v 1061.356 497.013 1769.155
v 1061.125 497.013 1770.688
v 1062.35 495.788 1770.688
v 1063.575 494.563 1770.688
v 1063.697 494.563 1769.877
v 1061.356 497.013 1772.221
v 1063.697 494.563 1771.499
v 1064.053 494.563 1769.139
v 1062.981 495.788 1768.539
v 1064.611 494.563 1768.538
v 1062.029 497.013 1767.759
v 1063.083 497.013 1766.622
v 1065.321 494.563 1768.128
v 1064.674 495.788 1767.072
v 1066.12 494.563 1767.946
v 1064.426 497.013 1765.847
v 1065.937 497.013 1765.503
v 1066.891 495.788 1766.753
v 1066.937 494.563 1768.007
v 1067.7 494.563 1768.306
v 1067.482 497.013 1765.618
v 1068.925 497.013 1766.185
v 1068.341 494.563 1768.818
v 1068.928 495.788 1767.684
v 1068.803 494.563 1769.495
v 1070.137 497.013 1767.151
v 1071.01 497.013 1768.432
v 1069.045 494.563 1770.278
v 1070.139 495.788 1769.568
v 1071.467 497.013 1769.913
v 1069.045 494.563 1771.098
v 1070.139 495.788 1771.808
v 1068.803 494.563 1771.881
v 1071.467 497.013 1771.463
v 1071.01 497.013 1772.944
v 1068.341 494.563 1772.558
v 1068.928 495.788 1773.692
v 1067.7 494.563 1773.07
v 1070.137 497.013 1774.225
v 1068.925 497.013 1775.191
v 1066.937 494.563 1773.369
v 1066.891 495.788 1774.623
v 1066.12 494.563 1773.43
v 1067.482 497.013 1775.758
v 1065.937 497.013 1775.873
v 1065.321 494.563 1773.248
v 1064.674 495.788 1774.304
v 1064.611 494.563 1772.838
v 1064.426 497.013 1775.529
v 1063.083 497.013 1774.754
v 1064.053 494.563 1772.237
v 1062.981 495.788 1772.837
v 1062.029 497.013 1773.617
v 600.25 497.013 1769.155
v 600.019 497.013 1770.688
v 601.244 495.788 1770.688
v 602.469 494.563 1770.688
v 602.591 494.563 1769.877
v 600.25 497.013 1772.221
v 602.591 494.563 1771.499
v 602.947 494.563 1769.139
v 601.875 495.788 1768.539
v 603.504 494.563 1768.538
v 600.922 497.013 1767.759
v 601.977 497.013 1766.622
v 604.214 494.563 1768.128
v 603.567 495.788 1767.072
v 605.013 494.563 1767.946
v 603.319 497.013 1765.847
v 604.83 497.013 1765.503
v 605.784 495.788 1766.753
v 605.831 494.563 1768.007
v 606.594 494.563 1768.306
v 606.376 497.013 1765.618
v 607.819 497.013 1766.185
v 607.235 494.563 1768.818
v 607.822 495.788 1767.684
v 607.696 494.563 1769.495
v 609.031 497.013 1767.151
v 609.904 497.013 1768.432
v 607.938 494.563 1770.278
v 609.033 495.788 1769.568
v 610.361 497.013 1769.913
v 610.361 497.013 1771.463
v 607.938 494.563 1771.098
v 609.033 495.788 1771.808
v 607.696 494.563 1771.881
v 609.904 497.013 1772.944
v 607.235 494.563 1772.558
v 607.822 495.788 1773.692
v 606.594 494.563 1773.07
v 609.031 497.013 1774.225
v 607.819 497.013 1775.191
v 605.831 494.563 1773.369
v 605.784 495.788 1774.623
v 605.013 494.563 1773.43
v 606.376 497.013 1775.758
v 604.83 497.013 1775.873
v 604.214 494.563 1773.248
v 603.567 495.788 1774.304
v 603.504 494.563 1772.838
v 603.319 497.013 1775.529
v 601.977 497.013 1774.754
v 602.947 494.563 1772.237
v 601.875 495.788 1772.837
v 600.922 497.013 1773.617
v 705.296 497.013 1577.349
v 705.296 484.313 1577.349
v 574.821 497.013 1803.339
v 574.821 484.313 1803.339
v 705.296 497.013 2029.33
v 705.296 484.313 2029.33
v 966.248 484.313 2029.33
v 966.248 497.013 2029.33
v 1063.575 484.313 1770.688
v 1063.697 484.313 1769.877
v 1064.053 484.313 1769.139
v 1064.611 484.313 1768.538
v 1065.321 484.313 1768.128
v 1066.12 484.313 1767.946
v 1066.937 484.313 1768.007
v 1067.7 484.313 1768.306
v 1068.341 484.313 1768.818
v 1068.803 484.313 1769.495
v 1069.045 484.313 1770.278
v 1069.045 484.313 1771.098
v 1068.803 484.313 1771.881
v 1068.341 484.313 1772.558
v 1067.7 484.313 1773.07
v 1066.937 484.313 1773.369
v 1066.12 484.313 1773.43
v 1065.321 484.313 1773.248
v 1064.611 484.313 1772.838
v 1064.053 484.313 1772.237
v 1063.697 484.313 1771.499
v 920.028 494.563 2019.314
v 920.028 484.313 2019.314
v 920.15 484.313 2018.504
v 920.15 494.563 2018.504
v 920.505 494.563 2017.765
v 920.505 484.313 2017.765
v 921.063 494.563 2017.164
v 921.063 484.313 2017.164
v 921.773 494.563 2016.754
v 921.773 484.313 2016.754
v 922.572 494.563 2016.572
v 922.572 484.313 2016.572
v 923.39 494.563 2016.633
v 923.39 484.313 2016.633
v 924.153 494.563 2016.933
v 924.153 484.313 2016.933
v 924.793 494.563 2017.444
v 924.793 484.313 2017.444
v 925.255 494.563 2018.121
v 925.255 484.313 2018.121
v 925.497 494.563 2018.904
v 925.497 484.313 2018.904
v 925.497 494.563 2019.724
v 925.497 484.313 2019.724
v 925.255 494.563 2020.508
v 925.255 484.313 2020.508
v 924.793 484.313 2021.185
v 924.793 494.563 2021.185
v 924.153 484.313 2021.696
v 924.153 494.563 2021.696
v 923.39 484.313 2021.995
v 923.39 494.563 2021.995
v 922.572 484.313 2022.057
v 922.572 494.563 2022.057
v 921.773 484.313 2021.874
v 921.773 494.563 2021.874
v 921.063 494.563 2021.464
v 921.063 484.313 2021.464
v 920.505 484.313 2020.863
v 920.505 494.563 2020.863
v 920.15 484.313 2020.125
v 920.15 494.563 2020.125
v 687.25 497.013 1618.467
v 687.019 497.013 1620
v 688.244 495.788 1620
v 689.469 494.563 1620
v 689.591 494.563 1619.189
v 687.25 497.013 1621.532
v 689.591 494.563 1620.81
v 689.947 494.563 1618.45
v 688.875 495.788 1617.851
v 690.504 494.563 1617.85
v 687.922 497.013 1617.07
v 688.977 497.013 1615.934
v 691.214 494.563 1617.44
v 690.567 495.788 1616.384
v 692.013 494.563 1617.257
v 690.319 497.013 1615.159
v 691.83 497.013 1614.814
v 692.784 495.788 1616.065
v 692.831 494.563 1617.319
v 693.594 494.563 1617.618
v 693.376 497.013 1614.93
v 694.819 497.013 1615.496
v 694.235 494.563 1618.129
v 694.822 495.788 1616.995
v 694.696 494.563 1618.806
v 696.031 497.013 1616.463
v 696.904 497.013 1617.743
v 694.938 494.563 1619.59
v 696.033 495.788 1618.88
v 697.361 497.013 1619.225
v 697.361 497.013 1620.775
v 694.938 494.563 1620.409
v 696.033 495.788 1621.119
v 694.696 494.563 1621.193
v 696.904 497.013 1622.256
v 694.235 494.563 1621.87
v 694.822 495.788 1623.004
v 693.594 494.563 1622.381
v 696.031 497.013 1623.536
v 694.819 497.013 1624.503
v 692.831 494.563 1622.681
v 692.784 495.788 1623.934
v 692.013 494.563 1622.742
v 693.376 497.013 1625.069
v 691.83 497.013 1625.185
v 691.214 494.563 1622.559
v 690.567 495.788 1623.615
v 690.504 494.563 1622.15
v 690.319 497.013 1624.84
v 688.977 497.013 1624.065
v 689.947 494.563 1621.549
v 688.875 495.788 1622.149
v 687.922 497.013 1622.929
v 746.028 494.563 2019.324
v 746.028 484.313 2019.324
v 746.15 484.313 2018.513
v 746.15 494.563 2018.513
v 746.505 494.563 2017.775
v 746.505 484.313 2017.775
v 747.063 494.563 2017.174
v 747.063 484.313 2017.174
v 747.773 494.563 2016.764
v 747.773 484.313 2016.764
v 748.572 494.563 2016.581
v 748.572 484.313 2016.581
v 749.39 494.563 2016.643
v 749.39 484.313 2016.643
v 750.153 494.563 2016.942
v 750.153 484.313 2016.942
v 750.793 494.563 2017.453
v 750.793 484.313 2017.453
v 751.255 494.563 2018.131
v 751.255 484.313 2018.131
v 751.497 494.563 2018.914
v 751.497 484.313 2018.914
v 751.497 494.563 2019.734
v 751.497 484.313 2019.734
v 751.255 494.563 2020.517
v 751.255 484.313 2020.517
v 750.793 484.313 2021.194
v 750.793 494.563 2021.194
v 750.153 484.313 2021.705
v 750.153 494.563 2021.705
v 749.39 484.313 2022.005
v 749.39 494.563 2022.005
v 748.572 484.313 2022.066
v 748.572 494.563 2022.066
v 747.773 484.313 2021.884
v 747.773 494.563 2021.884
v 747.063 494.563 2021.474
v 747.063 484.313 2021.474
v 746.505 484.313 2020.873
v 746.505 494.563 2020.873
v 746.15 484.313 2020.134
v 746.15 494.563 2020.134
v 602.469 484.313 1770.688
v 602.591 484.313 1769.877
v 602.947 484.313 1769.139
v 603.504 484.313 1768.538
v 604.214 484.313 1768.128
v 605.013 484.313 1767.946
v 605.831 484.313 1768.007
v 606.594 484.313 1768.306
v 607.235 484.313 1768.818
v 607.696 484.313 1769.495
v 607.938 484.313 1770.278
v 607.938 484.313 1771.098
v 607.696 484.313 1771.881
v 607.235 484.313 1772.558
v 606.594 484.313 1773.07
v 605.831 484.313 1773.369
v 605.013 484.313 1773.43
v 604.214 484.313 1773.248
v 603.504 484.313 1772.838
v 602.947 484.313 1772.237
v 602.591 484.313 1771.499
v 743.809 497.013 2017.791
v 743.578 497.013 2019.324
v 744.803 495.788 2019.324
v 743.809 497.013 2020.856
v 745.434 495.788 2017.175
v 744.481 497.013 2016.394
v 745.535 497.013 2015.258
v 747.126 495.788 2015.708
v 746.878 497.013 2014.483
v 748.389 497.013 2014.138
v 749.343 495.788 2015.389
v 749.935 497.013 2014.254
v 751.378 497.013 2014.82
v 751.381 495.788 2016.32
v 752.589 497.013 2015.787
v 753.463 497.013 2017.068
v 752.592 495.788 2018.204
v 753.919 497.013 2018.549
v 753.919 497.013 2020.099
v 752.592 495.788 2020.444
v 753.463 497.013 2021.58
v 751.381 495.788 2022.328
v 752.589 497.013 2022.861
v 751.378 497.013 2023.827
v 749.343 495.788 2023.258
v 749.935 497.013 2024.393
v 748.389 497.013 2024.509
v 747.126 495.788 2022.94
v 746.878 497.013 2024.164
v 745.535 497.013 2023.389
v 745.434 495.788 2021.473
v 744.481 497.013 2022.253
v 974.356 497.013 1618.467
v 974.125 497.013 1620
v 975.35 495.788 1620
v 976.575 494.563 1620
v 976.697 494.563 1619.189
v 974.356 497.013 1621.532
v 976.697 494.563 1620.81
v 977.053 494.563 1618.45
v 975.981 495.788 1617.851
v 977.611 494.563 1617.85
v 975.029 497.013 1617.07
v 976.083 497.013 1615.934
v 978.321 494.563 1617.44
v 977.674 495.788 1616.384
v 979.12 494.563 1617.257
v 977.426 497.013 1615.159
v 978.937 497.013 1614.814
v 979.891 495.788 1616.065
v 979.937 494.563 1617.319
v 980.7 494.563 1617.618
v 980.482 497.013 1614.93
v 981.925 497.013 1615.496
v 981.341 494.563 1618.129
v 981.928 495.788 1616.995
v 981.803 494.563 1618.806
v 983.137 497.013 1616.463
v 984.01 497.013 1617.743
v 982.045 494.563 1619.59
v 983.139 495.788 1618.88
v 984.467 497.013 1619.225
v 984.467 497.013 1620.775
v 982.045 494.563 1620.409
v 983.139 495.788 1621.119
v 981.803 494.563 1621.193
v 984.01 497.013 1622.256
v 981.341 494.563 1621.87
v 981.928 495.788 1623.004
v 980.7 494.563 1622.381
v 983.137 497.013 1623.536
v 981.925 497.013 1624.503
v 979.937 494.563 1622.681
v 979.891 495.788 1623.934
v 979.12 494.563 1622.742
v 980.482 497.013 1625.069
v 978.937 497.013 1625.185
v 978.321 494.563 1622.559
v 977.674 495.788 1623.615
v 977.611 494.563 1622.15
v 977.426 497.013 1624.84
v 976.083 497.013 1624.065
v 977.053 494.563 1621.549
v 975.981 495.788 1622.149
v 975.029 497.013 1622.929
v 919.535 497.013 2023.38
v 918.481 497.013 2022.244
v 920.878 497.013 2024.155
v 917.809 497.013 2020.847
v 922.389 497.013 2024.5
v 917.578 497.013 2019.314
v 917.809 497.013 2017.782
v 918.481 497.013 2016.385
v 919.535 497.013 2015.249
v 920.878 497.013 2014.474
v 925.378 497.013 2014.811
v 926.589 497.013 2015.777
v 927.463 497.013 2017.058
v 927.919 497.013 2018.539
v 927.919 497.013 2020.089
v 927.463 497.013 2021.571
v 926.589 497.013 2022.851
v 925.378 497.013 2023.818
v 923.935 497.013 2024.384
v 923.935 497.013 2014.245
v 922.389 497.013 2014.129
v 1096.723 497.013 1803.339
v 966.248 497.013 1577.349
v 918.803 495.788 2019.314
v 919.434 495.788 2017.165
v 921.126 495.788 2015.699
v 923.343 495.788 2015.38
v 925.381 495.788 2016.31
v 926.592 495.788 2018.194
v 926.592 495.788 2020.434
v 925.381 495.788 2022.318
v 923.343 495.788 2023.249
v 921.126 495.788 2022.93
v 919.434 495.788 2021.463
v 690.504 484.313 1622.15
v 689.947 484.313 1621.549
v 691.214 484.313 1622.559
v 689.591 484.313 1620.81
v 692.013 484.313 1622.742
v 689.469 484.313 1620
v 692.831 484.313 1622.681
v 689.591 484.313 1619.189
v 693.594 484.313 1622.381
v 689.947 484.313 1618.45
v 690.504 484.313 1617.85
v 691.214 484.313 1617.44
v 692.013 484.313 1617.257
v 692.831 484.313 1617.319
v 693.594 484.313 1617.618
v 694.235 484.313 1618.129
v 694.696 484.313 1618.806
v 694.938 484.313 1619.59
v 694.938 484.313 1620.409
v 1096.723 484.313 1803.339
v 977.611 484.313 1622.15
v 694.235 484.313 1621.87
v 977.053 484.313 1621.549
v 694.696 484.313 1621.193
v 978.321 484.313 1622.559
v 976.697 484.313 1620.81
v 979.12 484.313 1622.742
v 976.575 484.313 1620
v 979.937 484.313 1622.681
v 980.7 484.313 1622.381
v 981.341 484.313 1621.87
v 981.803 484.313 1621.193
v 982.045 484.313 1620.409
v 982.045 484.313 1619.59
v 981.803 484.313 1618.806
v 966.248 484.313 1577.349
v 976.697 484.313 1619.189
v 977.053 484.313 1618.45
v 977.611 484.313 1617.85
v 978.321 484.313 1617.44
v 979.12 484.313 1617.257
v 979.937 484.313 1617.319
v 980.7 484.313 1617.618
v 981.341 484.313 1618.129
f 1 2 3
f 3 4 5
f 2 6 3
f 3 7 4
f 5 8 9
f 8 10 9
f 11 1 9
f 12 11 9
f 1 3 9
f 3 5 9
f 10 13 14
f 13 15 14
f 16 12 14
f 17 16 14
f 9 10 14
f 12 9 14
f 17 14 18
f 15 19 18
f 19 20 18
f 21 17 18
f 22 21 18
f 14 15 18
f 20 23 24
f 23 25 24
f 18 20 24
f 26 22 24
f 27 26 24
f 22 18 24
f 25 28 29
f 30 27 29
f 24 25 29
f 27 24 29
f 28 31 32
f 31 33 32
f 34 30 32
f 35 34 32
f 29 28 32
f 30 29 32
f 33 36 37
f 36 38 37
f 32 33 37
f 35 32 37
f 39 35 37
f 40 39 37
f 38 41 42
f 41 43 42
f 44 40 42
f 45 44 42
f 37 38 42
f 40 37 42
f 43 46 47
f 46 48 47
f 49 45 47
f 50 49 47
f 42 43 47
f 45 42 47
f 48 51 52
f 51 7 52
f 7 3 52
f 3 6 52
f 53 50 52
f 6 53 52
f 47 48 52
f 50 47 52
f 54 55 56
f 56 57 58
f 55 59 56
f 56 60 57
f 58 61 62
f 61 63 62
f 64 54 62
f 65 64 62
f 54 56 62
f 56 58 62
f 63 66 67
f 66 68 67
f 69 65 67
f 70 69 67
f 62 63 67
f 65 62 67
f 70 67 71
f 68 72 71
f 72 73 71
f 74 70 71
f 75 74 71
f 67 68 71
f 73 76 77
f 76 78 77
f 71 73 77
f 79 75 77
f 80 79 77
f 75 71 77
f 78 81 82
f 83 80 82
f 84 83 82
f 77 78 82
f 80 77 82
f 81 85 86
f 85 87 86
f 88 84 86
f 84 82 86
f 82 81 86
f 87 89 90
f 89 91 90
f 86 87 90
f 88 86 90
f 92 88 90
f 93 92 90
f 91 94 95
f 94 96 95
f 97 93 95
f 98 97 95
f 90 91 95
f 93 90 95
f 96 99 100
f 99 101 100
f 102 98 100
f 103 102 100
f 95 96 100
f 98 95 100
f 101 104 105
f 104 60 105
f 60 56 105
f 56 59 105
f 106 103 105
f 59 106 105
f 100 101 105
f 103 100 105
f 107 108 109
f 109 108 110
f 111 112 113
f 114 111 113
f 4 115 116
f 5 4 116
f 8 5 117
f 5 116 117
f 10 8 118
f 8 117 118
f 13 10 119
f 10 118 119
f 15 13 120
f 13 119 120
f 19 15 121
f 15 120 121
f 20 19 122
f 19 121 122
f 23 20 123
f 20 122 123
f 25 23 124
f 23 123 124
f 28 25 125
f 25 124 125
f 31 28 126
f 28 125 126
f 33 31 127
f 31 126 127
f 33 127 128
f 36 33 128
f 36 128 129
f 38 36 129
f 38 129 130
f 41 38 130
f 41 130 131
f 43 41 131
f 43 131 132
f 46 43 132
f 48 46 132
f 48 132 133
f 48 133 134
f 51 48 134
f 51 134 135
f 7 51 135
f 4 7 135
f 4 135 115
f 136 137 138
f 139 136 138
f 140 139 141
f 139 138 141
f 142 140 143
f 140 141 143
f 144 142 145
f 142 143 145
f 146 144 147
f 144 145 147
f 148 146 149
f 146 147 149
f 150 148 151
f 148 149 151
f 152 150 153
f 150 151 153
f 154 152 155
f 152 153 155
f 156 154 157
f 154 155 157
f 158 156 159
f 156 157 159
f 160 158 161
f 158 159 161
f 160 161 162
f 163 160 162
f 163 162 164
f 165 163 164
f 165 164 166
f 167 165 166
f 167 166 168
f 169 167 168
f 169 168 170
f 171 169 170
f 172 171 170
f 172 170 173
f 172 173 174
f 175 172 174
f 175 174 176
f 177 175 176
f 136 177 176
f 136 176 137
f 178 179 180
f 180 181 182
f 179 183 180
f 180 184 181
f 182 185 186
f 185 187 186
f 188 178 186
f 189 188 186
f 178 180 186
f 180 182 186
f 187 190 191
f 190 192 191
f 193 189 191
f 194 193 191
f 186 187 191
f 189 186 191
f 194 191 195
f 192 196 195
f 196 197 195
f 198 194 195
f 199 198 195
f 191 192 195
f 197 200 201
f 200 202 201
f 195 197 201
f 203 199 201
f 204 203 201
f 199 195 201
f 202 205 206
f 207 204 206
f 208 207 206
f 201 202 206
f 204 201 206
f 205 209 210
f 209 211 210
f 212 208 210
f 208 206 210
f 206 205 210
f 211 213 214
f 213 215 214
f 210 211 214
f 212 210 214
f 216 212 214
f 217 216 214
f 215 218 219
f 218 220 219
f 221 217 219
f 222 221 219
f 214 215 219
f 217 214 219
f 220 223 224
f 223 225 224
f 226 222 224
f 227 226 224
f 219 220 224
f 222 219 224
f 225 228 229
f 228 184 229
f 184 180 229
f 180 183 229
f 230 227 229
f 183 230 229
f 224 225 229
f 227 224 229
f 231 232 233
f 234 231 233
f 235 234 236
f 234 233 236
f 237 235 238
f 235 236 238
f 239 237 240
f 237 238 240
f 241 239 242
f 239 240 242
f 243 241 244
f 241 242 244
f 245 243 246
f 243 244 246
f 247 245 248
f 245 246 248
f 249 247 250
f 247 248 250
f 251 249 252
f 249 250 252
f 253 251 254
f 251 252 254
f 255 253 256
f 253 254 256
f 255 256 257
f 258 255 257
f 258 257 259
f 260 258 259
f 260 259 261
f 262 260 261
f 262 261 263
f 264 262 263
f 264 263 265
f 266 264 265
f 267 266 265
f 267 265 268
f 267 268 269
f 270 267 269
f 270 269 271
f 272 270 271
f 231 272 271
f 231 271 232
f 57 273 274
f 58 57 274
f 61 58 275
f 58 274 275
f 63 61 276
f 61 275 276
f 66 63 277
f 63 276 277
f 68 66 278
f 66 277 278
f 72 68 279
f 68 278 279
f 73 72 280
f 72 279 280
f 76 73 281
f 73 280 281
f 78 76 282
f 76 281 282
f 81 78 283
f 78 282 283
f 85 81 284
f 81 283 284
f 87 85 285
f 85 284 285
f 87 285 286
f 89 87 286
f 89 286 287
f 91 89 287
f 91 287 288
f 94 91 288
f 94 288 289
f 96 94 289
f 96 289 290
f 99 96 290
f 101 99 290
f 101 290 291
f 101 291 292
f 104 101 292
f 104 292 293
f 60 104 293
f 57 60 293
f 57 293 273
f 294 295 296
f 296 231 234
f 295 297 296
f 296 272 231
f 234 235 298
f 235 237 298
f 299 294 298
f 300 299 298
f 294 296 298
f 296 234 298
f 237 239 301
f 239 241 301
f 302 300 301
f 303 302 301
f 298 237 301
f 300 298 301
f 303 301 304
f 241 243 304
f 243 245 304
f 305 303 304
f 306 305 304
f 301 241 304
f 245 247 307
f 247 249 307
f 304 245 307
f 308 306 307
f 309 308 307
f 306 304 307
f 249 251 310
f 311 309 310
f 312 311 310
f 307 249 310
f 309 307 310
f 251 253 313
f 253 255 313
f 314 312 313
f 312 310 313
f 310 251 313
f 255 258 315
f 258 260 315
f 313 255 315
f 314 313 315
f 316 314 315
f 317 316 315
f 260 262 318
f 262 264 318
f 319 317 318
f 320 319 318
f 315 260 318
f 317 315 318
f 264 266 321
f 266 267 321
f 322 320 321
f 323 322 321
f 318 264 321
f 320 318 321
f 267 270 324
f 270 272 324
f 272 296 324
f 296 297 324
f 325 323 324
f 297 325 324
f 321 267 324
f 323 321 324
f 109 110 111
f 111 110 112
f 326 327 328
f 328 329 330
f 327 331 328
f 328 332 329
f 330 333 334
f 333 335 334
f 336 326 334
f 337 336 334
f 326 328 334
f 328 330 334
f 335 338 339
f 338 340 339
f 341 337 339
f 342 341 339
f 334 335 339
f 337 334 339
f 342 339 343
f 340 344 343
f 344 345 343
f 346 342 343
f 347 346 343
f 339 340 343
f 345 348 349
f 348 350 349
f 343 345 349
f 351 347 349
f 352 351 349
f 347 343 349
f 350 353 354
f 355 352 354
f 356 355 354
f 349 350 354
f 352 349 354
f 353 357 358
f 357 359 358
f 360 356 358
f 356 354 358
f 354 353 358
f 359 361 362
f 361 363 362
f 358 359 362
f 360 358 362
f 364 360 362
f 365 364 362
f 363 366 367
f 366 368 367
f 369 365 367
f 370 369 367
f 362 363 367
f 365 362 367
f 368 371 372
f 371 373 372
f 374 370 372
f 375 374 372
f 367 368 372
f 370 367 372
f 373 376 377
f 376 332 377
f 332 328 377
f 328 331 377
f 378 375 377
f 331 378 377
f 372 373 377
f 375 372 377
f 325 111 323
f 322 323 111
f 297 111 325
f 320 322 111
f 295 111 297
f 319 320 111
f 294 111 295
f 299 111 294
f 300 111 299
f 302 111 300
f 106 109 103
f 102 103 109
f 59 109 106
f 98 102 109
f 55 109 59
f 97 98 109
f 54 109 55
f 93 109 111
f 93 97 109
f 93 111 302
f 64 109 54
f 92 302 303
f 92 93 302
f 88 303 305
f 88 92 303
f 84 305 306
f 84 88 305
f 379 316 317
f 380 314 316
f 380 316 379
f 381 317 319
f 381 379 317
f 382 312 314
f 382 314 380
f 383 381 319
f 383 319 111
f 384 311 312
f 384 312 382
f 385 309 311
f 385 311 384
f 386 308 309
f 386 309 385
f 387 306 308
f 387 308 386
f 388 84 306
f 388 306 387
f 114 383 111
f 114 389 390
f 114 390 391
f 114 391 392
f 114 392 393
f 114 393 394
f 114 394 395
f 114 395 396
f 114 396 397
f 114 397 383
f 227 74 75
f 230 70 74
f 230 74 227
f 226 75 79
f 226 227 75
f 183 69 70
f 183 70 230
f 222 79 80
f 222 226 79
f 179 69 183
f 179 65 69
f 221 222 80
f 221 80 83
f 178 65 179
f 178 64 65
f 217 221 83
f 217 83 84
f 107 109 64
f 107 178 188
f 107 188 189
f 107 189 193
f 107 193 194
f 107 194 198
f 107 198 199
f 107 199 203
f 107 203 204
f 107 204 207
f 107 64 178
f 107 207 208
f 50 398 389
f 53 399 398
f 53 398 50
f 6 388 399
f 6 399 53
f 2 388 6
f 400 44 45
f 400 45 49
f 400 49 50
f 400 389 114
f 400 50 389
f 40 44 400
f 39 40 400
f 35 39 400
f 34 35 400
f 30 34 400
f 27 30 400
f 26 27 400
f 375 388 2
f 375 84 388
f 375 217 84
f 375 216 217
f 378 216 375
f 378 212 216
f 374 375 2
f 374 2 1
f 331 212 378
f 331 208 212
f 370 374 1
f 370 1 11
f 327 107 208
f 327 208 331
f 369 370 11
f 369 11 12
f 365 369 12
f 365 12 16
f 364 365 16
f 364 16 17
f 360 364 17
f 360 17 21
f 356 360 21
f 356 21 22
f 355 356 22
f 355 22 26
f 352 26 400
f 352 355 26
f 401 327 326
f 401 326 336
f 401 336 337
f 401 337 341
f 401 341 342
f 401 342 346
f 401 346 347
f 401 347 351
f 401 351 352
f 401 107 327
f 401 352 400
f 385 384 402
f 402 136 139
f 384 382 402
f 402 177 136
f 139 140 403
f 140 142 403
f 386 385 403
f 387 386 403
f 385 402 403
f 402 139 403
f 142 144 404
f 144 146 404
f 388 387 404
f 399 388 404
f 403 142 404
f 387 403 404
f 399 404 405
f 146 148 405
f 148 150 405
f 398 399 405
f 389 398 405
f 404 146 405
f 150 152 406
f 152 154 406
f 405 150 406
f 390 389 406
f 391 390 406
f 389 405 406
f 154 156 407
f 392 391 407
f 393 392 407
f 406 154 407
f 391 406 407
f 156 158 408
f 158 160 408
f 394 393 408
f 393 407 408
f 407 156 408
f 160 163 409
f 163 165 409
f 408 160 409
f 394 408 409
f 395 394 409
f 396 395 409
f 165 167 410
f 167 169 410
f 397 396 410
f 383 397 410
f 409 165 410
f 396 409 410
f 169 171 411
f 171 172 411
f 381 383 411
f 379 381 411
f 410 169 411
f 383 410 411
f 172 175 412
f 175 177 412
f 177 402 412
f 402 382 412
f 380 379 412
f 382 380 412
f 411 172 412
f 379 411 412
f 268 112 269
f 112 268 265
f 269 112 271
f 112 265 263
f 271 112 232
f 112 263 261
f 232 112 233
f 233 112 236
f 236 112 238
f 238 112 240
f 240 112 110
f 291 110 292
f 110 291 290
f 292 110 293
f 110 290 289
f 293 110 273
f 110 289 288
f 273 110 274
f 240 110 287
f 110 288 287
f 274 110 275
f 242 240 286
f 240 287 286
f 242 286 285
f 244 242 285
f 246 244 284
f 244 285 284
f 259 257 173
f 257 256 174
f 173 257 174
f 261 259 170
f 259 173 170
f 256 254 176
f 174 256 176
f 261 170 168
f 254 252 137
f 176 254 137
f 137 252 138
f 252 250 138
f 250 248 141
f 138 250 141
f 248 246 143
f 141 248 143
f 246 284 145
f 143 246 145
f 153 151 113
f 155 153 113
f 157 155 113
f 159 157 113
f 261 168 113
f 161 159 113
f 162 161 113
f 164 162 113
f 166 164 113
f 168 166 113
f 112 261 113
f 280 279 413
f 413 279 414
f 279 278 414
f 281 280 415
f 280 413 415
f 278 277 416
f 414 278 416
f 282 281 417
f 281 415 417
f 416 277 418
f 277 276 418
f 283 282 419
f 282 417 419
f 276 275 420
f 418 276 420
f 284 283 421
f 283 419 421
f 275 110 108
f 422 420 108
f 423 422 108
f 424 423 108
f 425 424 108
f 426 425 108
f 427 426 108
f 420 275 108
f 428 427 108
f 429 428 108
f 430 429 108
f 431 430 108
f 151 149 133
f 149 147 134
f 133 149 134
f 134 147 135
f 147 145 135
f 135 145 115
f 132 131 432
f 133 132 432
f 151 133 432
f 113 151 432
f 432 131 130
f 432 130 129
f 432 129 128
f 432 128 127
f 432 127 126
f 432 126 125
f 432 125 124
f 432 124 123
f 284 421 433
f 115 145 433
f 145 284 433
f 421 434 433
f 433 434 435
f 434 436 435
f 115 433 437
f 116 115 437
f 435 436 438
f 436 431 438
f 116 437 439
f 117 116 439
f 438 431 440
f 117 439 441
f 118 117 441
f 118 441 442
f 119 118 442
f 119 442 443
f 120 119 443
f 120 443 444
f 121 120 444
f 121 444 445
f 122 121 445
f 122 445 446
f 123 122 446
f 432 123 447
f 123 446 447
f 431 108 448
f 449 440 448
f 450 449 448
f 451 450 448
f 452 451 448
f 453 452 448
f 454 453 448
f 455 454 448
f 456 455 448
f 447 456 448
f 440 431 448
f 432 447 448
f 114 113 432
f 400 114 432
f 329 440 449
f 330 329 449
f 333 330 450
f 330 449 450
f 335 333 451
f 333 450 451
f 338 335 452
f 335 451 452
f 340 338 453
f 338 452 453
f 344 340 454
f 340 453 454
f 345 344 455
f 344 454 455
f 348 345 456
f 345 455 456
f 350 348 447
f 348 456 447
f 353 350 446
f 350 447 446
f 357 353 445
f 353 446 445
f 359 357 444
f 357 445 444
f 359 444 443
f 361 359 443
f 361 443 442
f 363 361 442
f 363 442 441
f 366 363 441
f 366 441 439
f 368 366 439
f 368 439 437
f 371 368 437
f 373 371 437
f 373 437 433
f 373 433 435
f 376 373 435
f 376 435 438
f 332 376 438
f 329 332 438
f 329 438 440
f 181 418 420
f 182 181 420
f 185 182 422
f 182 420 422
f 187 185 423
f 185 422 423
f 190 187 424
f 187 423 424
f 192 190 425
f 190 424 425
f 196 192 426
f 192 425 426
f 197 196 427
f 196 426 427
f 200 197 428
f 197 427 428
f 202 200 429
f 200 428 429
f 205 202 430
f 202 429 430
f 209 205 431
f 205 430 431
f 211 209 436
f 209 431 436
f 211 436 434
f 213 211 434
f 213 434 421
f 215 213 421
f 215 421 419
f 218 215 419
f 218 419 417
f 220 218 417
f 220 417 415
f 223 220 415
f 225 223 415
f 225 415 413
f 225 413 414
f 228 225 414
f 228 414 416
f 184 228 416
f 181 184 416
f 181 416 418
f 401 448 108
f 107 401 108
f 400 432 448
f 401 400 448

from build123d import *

# Parameters (mm, degrees)
BOSS_EXTRUDE1_DEPTH                             = 12.7
CSK_FOR_M5_FLAT_HEAD_MACHINE_SCREW1_D           = 5.5
CSK_FOR_M5_FLAT_HEAD_MACHINE_SCREW1_DEPTH       = 12.7
CSK_FOR_M5_FLAT_HEAD_MACHINE_SCREW1_CSINK_D     = 10.4
CSK_FOR_M5_FLAT_HEAD_MACHINE_SCREW1_CSINK_ANGLE = 90


with BuildPart() as part:
    # Sketch1 → Boss-Extrude1 (new body)
    with BuildSketch(Plane(origin=(0, 484.313360873, 0), x_dir=(1, 0, 0), z_dir=(0, 1, 0))):
        Polygon((1096.723413016, -1803.339072227), (966.247715506, -1577.348534986), (705.296320486, -1577.348534986), (574.820622976, -1803.339072227), (705.296320486, -2029.329609468), (966.247715506, -2029.329609468), align=None)
    extrude(amount=BOSS_EXTRUDE1_DEPTH)

    # CSK for M5 Flat Head Machine Screw1
    with Locations(Plane(origin=(0, 497.013360873, 0), x_dir=(1, 0, 0), z_dir=(0, 1, 0))):
        with Locations((605.218725769, -1770.688013736), (692.218725769, -1619.999593477), (979.325310224, -1619.999593477), (1066.325310224, -1770.688013736), (748.77757228, -2019.323746494), (922.777572027, -2019.31436283)):
            CounterSinkHole(CSK_FOR_M5_FLAT_HEAD_MACHINE_SCREW1_D / 2, CSK_FOR_M5_FLAT_HEAD_MACHINE_SCREW1_CSINK_D / 2, depth=CSK_FOR_M5_FLAT_HEAD_MACHINE_SCREW1_DEPTH, counter_sink_angle=CSK_FOR_M5_FLAT_HEAD_MACHINE_SCREW1_CSINK_ANGLE)


solid = part.part
